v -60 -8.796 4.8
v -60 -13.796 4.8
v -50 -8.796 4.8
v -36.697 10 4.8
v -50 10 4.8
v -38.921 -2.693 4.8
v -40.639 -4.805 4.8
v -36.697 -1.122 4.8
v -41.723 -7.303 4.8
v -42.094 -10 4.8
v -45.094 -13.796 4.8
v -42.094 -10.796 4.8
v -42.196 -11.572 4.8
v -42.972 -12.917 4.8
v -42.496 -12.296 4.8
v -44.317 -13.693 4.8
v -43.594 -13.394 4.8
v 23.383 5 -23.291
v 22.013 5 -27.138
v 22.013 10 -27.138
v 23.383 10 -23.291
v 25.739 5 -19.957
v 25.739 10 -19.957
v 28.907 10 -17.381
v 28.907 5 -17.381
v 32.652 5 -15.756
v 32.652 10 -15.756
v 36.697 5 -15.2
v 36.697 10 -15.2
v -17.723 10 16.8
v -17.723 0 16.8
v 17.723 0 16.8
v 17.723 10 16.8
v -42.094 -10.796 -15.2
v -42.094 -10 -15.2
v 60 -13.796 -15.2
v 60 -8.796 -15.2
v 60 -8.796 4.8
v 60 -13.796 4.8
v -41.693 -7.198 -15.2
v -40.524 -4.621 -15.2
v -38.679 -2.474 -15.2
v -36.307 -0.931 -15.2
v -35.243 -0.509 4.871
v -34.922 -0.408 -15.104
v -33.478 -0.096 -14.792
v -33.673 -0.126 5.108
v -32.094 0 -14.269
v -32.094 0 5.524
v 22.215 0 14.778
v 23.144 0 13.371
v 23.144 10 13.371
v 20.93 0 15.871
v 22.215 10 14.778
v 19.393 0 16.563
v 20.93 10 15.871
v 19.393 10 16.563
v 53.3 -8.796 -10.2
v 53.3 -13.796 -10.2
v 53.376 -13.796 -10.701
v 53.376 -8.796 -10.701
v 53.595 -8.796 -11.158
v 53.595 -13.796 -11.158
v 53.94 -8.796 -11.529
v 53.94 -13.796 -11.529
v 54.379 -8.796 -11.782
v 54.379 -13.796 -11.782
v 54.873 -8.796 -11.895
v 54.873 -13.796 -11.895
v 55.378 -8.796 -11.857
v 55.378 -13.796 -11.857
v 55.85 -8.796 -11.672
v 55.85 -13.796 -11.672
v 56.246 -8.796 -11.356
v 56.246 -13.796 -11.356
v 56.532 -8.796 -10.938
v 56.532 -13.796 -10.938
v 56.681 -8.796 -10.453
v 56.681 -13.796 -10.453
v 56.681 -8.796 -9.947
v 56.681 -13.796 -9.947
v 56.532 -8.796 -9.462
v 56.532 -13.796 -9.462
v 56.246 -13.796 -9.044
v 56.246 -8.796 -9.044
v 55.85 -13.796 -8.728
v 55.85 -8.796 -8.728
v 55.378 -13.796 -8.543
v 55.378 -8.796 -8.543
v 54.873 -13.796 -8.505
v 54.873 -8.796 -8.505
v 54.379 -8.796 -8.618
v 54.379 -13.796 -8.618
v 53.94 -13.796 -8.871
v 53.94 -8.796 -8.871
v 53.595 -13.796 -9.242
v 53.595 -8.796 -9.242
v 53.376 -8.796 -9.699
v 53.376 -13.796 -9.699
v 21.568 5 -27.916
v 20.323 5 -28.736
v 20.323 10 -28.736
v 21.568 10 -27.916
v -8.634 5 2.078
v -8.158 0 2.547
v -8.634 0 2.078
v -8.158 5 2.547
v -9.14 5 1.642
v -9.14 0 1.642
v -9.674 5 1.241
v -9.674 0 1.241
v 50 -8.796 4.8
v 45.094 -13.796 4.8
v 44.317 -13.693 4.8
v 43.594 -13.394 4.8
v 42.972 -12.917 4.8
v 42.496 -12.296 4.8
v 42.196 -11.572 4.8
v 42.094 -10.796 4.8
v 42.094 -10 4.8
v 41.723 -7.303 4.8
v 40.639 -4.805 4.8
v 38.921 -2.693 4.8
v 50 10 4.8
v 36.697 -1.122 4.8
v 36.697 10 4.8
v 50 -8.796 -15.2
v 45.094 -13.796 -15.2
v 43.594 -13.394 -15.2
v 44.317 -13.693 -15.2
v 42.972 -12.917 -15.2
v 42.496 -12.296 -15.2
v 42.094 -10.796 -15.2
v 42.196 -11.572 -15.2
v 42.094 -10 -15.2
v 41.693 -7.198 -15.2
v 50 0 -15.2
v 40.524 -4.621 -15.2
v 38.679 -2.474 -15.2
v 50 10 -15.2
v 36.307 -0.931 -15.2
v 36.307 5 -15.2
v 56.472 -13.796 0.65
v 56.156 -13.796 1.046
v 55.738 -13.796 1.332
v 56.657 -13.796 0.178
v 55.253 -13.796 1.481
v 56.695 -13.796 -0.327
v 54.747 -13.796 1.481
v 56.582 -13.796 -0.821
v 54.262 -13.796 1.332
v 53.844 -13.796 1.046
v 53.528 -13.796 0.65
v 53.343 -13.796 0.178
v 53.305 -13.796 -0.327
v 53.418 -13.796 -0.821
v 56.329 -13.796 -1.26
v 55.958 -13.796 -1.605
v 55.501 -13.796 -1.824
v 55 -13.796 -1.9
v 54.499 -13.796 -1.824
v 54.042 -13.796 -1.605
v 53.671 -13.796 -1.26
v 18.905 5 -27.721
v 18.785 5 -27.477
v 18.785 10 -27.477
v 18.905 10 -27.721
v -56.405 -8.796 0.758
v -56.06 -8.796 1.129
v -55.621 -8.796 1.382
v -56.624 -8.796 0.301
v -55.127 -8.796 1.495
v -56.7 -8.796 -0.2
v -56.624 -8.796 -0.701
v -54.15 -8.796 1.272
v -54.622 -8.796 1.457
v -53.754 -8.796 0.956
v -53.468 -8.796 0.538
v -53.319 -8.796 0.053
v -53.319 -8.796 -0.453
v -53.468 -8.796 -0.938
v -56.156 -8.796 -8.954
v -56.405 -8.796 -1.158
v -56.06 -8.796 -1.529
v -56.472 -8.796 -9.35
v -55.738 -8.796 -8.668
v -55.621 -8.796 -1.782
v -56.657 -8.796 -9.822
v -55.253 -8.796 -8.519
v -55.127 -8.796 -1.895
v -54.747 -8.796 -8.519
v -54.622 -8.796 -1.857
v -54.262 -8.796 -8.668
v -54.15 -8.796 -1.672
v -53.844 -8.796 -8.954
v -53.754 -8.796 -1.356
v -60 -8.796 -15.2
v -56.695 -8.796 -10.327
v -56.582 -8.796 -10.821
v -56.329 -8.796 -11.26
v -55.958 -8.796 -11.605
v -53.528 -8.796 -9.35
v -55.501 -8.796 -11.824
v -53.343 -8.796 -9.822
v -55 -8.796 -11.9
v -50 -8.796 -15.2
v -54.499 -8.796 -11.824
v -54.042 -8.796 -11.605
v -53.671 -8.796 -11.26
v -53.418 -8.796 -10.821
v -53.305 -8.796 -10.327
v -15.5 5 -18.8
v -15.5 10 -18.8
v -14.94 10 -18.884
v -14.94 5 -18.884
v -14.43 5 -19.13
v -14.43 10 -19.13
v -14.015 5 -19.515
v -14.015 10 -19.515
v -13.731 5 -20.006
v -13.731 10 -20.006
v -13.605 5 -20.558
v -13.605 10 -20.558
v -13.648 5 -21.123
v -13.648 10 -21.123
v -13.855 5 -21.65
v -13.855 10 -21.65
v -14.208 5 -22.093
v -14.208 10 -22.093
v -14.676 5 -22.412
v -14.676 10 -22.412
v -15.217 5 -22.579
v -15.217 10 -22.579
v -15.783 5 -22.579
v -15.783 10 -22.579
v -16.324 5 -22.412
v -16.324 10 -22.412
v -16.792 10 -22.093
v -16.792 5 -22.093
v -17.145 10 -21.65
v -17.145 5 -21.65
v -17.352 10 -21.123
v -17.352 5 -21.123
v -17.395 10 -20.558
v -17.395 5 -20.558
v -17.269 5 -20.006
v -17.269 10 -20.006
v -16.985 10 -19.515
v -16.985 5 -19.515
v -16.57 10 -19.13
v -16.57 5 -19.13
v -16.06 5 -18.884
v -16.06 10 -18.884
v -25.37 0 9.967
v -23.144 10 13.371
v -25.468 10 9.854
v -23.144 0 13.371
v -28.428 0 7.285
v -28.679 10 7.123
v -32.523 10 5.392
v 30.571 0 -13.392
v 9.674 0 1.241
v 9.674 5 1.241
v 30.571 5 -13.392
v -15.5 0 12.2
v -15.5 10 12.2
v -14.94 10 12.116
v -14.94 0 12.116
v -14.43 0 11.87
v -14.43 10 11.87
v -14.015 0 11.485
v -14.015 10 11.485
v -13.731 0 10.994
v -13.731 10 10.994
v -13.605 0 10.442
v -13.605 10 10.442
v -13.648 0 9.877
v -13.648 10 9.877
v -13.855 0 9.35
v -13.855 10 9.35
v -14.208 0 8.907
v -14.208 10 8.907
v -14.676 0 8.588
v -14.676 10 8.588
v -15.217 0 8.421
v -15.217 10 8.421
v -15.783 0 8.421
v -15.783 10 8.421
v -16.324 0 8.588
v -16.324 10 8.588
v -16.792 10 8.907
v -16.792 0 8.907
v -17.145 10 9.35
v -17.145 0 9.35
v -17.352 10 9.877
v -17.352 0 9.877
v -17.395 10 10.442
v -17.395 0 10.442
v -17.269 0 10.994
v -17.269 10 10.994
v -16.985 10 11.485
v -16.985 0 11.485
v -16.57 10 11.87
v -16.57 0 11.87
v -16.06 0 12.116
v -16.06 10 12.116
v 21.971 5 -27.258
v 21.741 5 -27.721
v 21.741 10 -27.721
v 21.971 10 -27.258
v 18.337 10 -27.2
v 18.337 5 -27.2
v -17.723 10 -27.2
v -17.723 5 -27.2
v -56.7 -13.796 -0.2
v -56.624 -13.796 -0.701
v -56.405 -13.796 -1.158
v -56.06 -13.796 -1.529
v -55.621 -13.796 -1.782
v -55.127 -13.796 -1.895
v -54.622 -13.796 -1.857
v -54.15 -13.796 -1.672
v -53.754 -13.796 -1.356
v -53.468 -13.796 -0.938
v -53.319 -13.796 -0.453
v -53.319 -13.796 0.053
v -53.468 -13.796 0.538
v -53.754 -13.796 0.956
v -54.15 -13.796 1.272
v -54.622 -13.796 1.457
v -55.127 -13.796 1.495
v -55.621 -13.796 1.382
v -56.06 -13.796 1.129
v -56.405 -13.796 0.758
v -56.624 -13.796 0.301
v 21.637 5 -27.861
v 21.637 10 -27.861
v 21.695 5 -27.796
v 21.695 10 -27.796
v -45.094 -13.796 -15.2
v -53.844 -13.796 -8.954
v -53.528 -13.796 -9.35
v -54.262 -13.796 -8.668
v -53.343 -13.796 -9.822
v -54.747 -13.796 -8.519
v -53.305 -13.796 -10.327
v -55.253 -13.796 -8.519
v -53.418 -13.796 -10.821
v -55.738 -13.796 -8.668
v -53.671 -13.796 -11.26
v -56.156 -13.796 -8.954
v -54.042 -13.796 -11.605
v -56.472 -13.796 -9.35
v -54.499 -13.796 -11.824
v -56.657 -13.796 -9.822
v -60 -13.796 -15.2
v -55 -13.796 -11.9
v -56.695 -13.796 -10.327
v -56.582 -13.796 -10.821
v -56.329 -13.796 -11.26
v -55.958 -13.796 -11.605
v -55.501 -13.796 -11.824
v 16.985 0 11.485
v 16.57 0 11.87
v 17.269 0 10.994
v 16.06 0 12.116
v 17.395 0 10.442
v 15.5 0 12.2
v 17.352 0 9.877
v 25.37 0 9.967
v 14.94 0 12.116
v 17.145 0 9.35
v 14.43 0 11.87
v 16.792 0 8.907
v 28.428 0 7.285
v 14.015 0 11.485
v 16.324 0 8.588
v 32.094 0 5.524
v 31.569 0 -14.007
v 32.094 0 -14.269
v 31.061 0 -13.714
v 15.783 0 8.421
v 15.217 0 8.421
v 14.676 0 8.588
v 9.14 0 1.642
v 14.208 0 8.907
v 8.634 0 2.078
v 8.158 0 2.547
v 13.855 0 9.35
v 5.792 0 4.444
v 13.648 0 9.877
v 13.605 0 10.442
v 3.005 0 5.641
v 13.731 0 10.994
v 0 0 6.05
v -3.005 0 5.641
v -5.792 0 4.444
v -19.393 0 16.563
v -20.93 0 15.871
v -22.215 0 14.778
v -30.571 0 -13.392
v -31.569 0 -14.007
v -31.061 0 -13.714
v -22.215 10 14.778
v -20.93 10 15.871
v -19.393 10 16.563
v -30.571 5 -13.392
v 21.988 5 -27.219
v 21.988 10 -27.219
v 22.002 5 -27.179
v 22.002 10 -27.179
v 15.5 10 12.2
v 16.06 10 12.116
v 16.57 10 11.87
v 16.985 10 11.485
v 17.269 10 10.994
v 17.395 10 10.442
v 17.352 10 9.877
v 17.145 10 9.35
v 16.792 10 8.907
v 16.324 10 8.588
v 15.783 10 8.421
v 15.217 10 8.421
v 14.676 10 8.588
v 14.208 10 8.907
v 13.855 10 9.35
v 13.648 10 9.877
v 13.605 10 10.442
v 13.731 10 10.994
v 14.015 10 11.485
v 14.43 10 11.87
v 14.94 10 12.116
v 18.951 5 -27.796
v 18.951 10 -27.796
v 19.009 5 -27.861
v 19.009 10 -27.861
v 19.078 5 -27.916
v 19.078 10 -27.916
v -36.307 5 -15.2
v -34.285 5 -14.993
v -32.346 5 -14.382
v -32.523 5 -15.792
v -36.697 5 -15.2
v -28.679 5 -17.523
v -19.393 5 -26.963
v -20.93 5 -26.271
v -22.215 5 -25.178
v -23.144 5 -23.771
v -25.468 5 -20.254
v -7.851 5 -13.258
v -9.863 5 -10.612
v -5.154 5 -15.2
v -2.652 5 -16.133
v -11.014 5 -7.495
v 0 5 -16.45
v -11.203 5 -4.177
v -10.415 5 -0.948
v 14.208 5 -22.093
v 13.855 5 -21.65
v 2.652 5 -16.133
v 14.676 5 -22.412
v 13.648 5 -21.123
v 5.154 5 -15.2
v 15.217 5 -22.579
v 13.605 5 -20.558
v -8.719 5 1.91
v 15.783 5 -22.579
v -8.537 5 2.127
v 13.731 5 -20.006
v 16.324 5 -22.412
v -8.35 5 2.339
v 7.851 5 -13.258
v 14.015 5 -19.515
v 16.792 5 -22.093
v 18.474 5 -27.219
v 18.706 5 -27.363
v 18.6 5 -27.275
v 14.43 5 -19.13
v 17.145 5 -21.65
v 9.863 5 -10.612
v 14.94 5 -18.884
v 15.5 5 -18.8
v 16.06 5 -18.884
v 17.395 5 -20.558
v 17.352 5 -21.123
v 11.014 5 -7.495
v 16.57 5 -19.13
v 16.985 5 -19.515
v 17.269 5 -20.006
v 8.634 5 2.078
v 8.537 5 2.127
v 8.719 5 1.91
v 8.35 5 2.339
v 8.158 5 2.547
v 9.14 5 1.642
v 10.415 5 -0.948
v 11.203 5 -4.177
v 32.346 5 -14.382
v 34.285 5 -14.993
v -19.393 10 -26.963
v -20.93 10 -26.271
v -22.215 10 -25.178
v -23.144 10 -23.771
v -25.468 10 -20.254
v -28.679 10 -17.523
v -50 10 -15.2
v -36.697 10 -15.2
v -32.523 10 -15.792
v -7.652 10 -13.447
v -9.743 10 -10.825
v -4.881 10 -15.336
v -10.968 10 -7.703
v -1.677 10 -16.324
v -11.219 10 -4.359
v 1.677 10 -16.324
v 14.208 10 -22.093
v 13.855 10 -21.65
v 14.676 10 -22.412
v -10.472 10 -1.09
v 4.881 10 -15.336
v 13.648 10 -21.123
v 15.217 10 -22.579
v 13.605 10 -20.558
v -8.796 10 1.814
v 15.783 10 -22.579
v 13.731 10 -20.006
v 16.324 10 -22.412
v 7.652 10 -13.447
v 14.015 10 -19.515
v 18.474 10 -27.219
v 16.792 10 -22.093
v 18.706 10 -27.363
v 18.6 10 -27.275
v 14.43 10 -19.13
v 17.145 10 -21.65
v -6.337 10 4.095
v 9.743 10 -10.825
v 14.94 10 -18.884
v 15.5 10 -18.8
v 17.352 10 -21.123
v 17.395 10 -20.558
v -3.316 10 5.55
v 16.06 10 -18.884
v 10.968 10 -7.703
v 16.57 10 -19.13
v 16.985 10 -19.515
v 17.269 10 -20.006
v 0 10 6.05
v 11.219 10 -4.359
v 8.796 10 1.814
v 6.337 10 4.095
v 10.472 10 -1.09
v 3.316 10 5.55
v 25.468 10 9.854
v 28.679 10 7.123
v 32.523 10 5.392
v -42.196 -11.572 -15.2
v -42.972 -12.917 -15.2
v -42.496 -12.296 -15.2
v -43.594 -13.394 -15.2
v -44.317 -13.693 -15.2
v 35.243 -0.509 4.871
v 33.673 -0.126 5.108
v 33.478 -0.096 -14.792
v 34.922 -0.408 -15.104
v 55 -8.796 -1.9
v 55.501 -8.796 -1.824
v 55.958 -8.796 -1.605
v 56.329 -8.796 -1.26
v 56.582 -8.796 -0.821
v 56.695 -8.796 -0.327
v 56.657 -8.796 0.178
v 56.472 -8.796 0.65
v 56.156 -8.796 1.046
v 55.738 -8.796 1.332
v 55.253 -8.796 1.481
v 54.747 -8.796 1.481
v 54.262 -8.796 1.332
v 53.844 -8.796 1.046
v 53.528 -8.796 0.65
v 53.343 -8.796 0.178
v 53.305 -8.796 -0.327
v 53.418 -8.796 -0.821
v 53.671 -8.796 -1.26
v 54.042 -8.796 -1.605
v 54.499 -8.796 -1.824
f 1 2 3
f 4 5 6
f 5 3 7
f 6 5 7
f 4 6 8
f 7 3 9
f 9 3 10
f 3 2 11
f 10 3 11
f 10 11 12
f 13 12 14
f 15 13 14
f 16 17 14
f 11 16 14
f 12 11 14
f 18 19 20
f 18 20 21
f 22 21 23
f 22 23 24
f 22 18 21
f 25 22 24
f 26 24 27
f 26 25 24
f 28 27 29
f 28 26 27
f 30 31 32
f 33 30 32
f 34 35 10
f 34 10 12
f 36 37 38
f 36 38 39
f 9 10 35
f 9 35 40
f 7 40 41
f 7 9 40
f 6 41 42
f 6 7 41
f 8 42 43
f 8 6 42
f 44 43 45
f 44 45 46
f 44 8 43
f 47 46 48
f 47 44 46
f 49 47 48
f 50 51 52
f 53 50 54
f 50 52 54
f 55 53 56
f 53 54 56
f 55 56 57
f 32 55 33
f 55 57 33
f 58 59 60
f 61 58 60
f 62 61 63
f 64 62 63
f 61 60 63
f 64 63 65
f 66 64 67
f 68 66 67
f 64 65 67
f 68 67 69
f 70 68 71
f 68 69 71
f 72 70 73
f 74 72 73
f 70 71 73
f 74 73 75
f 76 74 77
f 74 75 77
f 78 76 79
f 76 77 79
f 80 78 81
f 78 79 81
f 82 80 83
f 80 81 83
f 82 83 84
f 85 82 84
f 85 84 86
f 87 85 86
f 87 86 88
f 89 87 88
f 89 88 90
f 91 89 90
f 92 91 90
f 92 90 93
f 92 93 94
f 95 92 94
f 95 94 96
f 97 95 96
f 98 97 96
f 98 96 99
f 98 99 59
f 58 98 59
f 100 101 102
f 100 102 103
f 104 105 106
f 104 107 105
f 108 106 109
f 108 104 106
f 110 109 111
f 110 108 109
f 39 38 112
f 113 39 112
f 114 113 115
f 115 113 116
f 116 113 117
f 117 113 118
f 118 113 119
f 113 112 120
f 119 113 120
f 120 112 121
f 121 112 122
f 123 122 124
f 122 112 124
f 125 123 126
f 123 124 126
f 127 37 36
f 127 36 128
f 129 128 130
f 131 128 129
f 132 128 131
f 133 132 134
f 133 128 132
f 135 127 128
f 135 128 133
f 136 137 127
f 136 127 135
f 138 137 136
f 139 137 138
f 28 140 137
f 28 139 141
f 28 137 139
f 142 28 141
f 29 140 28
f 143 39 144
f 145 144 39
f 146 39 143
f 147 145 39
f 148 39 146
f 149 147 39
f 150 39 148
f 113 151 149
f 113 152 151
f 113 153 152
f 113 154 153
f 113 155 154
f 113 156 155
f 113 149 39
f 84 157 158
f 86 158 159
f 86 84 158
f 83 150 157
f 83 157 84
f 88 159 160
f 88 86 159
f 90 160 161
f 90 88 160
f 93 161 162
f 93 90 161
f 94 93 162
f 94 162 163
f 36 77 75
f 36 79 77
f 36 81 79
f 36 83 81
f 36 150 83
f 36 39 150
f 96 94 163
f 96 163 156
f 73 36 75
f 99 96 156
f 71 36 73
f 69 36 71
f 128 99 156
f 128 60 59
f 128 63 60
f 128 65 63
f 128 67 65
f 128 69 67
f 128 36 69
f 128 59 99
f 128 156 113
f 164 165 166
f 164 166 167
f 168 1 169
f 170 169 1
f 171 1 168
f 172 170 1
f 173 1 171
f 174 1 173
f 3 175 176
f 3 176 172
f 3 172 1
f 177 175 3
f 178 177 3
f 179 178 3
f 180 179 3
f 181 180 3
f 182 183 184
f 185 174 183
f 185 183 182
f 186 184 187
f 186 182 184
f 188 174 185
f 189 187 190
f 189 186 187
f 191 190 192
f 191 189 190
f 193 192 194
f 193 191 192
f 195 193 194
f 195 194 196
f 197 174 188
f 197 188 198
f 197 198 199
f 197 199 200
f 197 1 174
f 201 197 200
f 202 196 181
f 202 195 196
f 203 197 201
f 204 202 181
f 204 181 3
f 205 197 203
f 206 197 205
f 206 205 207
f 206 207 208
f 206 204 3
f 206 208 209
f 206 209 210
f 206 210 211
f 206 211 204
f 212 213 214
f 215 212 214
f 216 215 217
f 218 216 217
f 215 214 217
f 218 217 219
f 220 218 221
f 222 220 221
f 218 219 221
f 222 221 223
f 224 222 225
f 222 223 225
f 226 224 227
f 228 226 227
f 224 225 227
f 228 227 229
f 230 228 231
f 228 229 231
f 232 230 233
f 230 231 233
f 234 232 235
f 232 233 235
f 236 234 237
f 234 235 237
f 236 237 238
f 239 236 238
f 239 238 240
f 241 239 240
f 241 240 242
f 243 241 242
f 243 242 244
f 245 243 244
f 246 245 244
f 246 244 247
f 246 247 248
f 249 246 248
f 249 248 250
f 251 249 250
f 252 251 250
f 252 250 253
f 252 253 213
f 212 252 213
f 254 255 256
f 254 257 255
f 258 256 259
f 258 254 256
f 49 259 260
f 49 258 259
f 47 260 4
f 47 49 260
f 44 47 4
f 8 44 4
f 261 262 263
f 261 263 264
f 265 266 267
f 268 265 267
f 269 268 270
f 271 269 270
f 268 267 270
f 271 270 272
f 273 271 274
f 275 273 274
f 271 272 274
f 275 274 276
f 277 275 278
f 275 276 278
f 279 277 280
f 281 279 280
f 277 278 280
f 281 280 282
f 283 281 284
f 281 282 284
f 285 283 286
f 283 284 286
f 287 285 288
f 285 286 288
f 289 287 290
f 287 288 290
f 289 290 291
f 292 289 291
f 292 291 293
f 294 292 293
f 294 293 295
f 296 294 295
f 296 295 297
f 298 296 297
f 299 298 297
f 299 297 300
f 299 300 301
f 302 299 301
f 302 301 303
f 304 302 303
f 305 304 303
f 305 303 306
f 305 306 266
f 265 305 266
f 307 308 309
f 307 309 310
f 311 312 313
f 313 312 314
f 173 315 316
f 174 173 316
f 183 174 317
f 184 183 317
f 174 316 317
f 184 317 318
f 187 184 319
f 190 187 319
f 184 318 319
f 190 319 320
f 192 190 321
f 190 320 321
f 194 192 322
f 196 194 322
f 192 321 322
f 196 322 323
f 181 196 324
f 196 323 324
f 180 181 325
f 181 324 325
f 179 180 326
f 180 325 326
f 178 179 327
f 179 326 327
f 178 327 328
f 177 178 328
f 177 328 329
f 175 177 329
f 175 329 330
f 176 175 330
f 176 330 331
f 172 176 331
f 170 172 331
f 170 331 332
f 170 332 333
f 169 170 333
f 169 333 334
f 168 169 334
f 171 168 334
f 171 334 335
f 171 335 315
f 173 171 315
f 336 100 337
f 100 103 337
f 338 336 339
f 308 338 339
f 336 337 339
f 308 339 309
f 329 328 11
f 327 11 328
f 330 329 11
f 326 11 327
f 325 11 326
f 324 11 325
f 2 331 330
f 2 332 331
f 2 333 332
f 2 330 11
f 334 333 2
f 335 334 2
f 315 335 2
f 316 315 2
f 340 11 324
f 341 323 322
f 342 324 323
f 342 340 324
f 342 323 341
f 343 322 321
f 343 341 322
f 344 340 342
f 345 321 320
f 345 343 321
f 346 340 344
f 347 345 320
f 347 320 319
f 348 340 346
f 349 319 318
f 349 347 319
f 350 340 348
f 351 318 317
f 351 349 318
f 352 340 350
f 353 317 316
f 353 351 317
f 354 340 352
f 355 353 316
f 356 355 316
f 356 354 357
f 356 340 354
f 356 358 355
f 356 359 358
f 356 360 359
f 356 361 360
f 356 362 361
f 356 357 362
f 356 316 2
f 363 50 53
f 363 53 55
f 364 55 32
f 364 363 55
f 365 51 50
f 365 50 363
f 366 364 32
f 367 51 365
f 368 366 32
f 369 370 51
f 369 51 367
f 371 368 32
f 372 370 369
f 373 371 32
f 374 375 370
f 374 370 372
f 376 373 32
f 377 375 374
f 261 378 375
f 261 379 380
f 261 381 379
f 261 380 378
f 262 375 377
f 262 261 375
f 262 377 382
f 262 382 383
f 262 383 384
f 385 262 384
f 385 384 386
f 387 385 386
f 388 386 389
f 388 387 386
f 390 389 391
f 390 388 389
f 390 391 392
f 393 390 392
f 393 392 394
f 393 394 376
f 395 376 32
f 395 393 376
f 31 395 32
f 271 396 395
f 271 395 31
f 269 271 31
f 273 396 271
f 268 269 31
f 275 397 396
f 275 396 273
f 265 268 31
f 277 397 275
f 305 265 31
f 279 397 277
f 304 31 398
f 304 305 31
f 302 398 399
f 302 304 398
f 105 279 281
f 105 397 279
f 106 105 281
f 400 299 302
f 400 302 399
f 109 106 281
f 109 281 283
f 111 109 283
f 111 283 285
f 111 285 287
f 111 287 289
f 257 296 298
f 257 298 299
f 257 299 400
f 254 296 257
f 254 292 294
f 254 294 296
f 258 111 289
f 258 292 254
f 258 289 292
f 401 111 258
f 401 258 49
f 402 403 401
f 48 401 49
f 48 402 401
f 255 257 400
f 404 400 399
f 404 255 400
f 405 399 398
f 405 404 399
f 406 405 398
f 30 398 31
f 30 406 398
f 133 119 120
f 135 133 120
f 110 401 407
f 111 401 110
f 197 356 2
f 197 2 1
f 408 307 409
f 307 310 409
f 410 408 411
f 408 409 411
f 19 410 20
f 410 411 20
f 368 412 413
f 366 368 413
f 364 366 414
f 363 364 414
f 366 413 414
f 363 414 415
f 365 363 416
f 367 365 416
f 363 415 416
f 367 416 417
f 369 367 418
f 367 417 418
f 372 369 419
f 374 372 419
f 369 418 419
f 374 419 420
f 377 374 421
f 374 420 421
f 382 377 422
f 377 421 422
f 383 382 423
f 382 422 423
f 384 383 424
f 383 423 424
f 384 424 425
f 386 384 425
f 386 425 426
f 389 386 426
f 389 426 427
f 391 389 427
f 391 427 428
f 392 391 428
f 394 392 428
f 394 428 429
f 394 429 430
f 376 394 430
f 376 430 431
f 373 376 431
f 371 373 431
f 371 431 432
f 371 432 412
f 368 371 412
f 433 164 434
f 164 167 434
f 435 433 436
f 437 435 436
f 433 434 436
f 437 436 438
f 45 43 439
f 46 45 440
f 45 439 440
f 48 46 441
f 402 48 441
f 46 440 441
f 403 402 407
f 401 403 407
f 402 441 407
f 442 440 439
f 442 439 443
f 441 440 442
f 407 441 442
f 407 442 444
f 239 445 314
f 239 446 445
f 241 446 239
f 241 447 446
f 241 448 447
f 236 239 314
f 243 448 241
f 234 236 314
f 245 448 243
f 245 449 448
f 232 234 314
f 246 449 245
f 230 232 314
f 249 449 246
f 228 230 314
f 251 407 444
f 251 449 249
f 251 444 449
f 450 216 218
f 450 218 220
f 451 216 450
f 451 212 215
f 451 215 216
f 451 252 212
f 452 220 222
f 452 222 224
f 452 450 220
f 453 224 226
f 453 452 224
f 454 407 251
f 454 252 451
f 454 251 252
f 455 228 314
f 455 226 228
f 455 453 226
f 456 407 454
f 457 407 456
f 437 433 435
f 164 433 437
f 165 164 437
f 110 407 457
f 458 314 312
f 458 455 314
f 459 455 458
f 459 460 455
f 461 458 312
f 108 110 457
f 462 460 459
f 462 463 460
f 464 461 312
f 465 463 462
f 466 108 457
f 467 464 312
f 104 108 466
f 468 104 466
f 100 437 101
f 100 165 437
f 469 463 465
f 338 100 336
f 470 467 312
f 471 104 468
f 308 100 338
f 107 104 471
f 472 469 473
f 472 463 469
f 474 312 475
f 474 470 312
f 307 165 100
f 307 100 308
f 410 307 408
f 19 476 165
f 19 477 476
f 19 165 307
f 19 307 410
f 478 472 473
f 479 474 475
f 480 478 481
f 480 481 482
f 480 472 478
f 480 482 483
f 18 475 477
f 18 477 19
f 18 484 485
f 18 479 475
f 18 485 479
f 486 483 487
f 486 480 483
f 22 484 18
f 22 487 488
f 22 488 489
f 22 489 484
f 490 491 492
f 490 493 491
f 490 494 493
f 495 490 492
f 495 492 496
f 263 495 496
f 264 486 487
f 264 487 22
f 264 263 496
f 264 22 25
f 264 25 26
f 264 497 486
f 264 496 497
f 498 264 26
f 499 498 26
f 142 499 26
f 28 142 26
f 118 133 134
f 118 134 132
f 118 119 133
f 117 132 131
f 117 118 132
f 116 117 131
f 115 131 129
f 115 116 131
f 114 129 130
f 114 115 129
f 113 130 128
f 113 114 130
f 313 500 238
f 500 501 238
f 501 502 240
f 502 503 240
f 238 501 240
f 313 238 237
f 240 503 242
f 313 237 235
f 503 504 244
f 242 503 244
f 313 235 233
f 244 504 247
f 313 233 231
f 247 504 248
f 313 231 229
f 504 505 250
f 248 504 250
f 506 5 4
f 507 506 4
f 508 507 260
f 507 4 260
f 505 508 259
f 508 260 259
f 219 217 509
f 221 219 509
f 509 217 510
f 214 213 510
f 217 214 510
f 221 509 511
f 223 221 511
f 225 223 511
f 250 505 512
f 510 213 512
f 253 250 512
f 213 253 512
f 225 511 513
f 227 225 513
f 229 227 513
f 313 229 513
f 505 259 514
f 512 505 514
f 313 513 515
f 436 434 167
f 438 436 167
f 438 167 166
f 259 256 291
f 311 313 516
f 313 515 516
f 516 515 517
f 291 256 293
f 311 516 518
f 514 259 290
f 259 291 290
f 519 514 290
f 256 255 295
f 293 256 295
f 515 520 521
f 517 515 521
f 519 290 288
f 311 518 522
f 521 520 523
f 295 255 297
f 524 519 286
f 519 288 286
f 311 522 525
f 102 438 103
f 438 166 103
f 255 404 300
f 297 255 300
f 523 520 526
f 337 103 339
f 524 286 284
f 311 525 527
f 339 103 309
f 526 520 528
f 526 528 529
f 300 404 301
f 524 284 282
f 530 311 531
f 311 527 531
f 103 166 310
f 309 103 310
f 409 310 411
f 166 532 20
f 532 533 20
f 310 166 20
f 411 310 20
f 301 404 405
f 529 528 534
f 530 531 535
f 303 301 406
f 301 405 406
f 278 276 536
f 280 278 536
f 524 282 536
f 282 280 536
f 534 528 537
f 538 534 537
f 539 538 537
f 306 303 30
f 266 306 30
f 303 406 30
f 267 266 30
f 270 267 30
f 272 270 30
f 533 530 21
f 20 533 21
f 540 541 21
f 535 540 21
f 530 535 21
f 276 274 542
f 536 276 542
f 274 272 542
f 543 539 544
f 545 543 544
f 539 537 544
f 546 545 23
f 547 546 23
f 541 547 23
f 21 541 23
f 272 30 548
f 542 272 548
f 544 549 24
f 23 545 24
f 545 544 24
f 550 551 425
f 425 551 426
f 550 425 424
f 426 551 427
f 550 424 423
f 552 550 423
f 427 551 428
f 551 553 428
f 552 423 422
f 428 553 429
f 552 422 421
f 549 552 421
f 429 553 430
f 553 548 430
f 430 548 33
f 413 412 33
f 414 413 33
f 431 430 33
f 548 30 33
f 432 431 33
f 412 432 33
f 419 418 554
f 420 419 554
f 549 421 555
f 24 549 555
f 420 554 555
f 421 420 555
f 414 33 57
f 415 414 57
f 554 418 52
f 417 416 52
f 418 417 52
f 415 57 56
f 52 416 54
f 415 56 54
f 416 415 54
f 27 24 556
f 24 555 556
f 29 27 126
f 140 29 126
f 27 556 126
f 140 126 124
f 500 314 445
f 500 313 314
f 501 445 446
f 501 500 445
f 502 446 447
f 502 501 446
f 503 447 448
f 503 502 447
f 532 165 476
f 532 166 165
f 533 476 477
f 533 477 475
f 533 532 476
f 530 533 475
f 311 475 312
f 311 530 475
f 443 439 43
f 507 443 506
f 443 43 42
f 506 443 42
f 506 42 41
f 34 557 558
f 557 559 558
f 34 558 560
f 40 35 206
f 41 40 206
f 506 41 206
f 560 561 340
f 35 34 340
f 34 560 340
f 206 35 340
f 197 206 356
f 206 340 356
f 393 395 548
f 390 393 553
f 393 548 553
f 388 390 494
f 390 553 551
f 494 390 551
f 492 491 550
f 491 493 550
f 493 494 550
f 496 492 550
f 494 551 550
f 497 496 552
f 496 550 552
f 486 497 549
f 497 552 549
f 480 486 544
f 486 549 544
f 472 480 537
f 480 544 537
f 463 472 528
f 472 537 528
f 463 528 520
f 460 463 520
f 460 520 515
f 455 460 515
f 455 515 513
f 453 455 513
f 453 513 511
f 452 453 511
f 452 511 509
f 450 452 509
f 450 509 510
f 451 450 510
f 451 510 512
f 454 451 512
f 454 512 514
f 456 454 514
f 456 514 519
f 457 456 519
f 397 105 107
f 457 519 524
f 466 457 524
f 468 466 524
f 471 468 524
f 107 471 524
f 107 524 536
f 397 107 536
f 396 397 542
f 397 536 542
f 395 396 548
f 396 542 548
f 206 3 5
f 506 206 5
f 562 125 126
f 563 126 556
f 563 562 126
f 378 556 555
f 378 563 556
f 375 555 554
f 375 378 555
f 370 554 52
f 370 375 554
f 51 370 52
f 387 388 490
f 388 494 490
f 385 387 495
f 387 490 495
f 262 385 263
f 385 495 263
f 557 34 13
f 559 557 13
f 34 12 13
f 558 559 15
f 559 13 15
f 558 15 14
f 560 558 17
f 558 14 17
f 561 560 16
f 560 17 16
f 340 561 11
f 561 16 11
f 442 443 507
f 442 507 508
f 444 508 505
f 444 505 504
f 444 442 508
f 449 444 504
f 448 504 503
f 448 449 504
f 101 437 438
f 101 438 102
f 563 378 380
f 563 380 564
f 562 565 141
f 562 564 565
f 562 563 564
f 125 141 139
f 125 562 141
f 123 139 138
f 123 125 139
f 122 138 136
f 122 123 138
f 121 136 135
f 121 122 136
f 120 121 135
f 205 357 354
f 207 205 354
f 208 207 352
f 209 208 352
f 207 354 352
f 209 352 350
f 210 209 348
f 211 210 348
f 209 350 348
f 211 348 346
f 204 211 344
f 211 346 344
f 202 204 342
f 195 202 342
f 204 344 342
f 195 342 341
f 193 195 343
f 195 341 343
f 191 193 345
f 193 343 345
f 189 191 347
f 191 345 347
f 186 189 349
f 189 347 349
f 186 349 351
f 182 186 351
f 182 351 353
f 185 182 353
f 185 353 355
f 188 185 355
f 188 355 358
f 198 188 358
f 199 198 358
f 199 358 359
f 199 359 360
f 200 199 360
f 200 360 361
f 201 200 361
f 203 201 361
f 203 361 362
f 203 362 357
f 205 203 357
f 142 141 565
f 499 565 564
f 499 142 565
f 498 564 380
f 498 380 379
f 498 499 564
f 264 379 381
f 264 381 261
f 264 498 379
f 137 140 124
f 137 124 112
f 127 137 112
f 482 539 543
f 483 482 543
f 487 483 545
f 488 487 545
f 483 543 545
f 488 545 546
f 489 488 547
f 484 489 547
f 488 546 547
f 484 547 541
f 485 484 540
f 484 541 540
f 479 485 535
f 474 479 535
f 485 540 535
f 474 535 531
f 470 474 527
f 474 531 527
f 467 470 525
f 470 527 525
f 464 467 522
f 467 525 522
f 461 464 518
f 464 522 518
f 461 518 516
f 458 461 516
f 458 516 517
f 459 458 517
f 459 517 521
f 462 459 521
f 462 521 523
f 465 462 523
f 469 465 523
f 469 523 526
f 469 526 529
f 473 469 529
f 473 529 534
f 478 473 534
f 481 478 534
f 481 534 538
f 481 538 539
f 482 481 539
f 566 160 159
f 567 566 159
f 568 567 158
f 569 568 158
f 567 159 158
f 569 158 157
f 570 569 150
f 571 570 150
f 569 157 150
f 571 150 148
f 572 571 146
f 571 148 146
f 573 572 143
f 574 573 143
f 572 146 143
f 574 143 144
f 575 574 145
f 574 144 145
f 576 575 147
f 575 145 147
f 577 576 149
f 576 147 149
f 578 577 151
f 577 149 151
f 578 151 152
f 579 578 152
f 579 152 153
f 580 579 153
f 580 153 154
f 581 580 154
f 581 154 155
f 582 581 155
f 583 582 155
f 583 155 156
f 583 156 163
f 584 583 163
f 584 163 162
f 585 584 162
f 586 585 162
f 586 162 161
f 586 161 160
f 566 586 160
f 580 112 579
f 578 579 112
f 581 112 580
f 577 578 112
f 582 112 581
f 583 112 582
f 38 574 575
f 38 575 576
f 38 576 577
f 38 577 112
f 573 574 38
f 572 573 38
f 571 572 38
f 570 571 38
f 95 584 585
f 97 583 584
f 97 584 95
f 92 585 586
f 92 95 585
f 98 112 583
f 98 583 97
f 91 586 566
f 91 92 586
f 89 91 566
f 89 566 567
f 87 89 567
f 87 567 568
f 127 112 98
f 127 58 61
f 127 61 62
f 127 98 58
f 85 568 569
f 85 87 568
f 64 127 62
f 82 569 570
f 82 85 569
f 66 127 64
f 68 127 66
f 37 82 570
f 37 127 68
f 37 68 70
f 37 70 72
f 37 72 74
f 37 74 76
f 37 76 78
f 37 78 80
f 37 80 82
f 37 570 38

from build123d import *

# Parameters (mm, degrees)
AUFSATZ_LINEAR_AUSTRAGEN1_DEPTH      = 10
SKIZZE6_R                            = 1.9
SKIZZE6_R_2                          = 11.25
SCHNITT_LINEAR_AUSTRAGEN4_DEPTH      = 67.632124385
SKIZZE7_W                            = 20.880821379
SKIZZE7_H                            = 5
SCHNITT_LINEAR_AUSTRAGEN5_DEPTH      = 87.970339772
VERRUNDUNG3_R                        = 15
SCHNITT_LINEAR_AUSTRAGEN6_DEPTH      = 69.73136111
SCHNITT_LINEAR_AUSTRAGEN6_DEPTH_BACK = 69.73136111
SKIZZE8_W                            = 10
SKIZZE8_H                            = 10
AUFSATZ_LINEAR_AUSTRAGEN4_DEPTH      = 20
VERRUNDUNG7_R                        = 10
VERRUNDUNG8_R                        = 3
SKIZZE16_R                           = 1.7
SCHNITT_LINEAR_AUSTRAGEN8_DEPTH      = 10
AUFSATZ_LINEAR_AUSTRAGEN6_DEPTH      = 5
VERRUNDUNG9_R                        = 0.5
FASE1_START                          = -13.795598923
FASE1_DEPTH                          = 18.795598923
VERRUNDUNG10_R                       = 10
VERRUNDUNG11_R                       = 6


with BuildPart() as part:
    # Skizze1 → Aufsatz-Linear austragen1 (new body)
    with BuildSketch(Plane(origin=(0, 0, 0), x_dir=(1, 0, 0), z_dir=(0, 1, 0))):
        Polygon((-60, -4.8), (-22, -4.8), (-22, -16.8), (22, -16.8), (22, -4.8), (60, -4.8), (60, 15.2), (22, 15.2), (22, 27.2), (0, 27.2), (-22, 27.2), (-22, 15.2), (-60, 15.2), align=None)
    extrude(amount=AUFSATZ_LINEAR_AUSTRAGEN1_DEPTH)

    # Skizze6 → Schnitt-Linear austragen4 (cut, through all)
    with BuildSketch(Plane(origin=(0, 10, 0), x_dir=(1, 0, 0), z_dir=(0, 1, 0))):
        with Locations(Location((15.5, 20.7, 0), (0, 0, 270))):
            Circle(SKIZZE6_R)
        with Locations(Location((15.5, -10.3, 0), (0, 0, 270))):
            Circle(SKIZZE6_R)
        with Locations(Location((-15.5, -10.3, 0), (0, 0, 270))):
            Circle(SKIZZE6_R)
        with Locations(Location((-15.5, 20.7, 0), (0, 0, 270))):
            Circle(SKIZZE6_R)
        with Locations(Location((0, 5.2, 0), (0, 0, 270))):
            Circle(SKIZZE6_R_2)
    extrude(amount=-SCHNITT_LINEAR_AUSTRAGEN4_DEPTH, mode=Mode.SUBTRACT)

    # Skizze7 → Schnitt-Linear austragen5 (cut, through all)
    with BuildSketch(Plane.ZY.offset(22)):
        with Locations((-25.64041069, 2.5)):
            Rectangle(SKIZZE7_W, SKIZZE7_H)
    extrude(amount=-SCHNITT_LINEAR_AUSTRAGEN5_DEPTH, mode=Mode.SUBTRACT)

    # Verrundung3
    # the kernel refuses this fillet: 15 mm, written as the material it adds along each edge
    with BuildSketch(Plane(origin=(-22, 5, -15.2), x_dir=(0, 0, -1), z_dir=(0, 1, 0))) as verrundung3_piece_1:
        with BuildLine():
            CenterArc((15, 14.696938457), VERRUNDUNG3_R, 180, 78.463040967)
            Line((0, 14.696938457), (-0.3, 14.696938457))
            Line((-0.3, 14.696938457), (-0.3, 0))
            Line((-0.3, 0), (0, -0.3))
            ThreePointArc((0, -0.3), (6, -0.3), (11.94, -0.293938769))
            Line((11.94, -0.293938769), (12, 0))
        make_face()
    extrude(amount=5)
    with BuildSketch(Plane(origin=(-22, 0, 4.8), x_dir=(-1, 0, 0), z_dir=(0, 1, 0))) as verrundung3_piece_2:
        with BuildLine():
            CenterArc((14.696938457, 15), VERRUNDUNG3_R, 191.536959033, 78.463040967)
            Line((0, 12), (-0.293938769, 11.94))
            ThreePointArc((-0.293938769, 11.94), (-0.3, 6), (-0.3, 0))
            Line((-0.3, 0), (0, -0.3))
            Line((0, -0.3), (14.696938457, -0.3))
            Line((14.696938457, -0.3), (14.696938457, 0))
        make_face()
    extrude(amount=10)
    with BuildSketch(Plane(origin=(22, 0, 4.8), x_dir=(1, 0, 0), z_dir=(0, 1, 0))) as verrundung3_piece_3:
        with BuildLine():
            CenterArc((14.696938457, -15), VERRUNDUNG3_R, 90, 78.463040967)
            Line((0, -12), (-0.293938769, -11.94))
            ThreePointArc((-0.293938769, -11.94), (-0.3, -6), (-0.3, 0))
            Line((-0.3, 0), (0, 0.3))
            Line((0, 0.3), (14.696938457, 0.3))
            Line((14.696938457, 0.3), (14.696938457, 0))
        make_face()
    extrude(amount=10)
    with BuildSketch(Plane(origin=(22, 5, -15.2), x_dir=(1, 0, 0), z_dir=(0, 1, 0))) as verrundung3_piece_4:
        with BuildLine():
            CenterArc((14.696938457, 15), VERRUNDUNG3_R, 191.536959033, 78.463040967)
            Line((0, 12), (-0.293938769, 11.94))
            ThreePointArc((-0.293938769, 11.94), (-0.3, 6), (-0.3, 0))
            Line((-0.3, 0), (0, -0.3))
            Line((0, -0.3), (14.696938457, -0.3))
            Line((14.696938457, -0.3), (14.696938457, 0))
        make_face()
    extrude(amount=5)

    # Skizze8 → Schnitt-Linear austragen6 (cut, two sides: drawn at the far end of the back side and taken through both)
    with BuildSketch(Plane(origin=(0, 0, -15.2), x_dir=(-1, 0, 0), z_dir=(0, 0, -1)).offset(-SCHNITT_LINEAR_AUSTRAGEN6_DEPTH_BACK)):
        with Locations((-55, 5)):
            Rectangle(SKIZZE8_W, SKIZZE8_H)
        with Locations((55, 5)):
            Rectangle(SKIZZE8_W, SKIZZE8_H)
    extrude(amount=SCHNITT_LINEAR_AUSTRAGEN6_DEPTH + SCHNITT_LINEAR_AUSTRAGEN6_DEPTH_BACK, mode=Mode.SUBTRACT)

    # Skizze12 → Aufsatz-Linear austragen4 (add)
    with BuildSketch(Plane(origin=(0, 0, -15.2), x_dir=(-1, 0, 0), z_dir=(0, 0, -1))):
        Polygon((-50, 0), (-50, -8.795598923), (-60, -8.795598923), (-60, -13.795598923), (-42.093723734, -13.795598923), (-42.093723734, 0), align=None)
        Polygon((50, 0), (42.093723734, 0), (42.093723734, -13.795598923), (60, -13.795598923), (60, -8.795598923), (50, -8.795598923), align=None)
    extrude(amount=-AUFSATZ_LINEAR_AUSTRAGEN4_DEPTH)

    # Verrundung7
    verrundung7_edges = [part.edges().sort_by_distance(p)[0] for p in [
        (42.093723734, 0, -5.2),
        (-42.093723734, 0, -5.2),
    ]]
    fillet(verrundung7_edges, radius=VERRUNDUNG7_R)

    # Verrundung8
    verrundung8_edges = [part.edges().sort_by_distance(p)[0] for p in [
        (42.093723734, -13.795598923, -5.2),
        (-42.093723734, -13.795598923, -5.2),
    ]]
    fillet(verrundung8_edges, radius=VERRUNDUNG8_R)

    # Skizze16 → Schnitt-Linear austragen8 (cut)
    with BuildSketch(Plane.XZ.offset(13.795598923)):
        with Locations(Location((-55, -10.2, 0), (0, 0, 270))):
            Circle(SKIZZE16_R)
        with Locations(Location((-55, -0.2, 0), (0, 0, 180))):
            Circle(SKIZZE16_R)
        with Locations(Location((55, -0.2, 0), (0, 0, 270))):
            Circle(SKIZZE16_R)
        with Locations(Location((55, -10.2, 0), (0, 0, 180))):
            Circle(SKIZZE16_R)
    extrude(amount=-SCHNITT_LINEAR_AUSTRAGEN8_DEPTH, mode=Mode.SUBTRACT)

    # Skizze17 → Aufsatz-Linear austragen6 (add)
    with BuildSketch(Plane.XZ.offset(-5)):
        Polygon((22, -27.2), (20.323301152, -27.2), (20.323301152, -28.736029672), (21.681082582, -27.841522035), align=None)
        Polygon((20.323301152, -28.736029672), (20.323301152, -27.2), (18.646602303, -27.2), (18.965519721, -27.841522035), align=None)
    extrude(amount=-AUFSATZ_LINEAR_AUSTRAGEN6_DEPTH)

    # Verrundung9
    verrundung9_edges = [part.edges().sort_by_distance(p)[0] for p in [
        (22, 7.5, -27.2),
        (18.646602303, 7.5, -27.2),
        (21.681082582, 7.5, -27.841522035),
        (18.965519721, 7.5, -27.841522035),
    ]]
    fillet(verrundung9_edges, radius=VERRUNDUNG9_R)

    # Fase1: read off the stored shape, not the designer's step
    # Fase1 outline → Fase1 (cut)
    with BuildSketch(Plane(origin=(0, 0, 0), x_dir=(1, 0, 0), z_dir=(0, 1, 0)).offset(FASE1_START)):
        with BuildLine():
            Line((-5.153882032, 15.2), (-33.153882032, 15.2))
            Line((-33.153882032, 15.2), (-8.71856035, -1.90979644))
            ThreePointArc((-8.71856035, -1.90979644), (-11.013512063, 7.494570119), (-5.153882032, 15.2))
        make_face()
        with BuildLine():
            ThreePointArc((5.153882032, 15.2), (11.013512063, 7.494570119), (8.71856035, -1.90979644))
            Line((8.71856035, -1.90979644), (33.153882032, 15.2))
            Line((33.153882032, 15.2), (5.153882032, 15.2))
        make_face()
    extrude(amount=FASE1_DEPTH, mode=Mode.SUBTRACT)

    # Verrundung10
    verrundung10_edges = [part.edges().sort_by_distance(p)[0] for p in [
        (-8.71856035, 2.5, 1.90979644),
        (8.71856035, 2.5, 1.90979644),
        (-33.153882032, 2.471822211, -15.2),
        (33.153882032, 2.471822211, -15.2),
    ]]
    fillet(verrundung10_edges, radius=VERRUNDUNG10_R)

    # Verrundung11
    verrundung11_edges = [part.edges().sort_by_distance(p)[0] for p in [
        (22, 5, 16.8),
        (-22, 5, 16.8),
        (-22, 7.5, -27.2),
    ]]
    fillet(verrundung11_edges, radius=VERRUNDUNG11_R)


solid = part.part
